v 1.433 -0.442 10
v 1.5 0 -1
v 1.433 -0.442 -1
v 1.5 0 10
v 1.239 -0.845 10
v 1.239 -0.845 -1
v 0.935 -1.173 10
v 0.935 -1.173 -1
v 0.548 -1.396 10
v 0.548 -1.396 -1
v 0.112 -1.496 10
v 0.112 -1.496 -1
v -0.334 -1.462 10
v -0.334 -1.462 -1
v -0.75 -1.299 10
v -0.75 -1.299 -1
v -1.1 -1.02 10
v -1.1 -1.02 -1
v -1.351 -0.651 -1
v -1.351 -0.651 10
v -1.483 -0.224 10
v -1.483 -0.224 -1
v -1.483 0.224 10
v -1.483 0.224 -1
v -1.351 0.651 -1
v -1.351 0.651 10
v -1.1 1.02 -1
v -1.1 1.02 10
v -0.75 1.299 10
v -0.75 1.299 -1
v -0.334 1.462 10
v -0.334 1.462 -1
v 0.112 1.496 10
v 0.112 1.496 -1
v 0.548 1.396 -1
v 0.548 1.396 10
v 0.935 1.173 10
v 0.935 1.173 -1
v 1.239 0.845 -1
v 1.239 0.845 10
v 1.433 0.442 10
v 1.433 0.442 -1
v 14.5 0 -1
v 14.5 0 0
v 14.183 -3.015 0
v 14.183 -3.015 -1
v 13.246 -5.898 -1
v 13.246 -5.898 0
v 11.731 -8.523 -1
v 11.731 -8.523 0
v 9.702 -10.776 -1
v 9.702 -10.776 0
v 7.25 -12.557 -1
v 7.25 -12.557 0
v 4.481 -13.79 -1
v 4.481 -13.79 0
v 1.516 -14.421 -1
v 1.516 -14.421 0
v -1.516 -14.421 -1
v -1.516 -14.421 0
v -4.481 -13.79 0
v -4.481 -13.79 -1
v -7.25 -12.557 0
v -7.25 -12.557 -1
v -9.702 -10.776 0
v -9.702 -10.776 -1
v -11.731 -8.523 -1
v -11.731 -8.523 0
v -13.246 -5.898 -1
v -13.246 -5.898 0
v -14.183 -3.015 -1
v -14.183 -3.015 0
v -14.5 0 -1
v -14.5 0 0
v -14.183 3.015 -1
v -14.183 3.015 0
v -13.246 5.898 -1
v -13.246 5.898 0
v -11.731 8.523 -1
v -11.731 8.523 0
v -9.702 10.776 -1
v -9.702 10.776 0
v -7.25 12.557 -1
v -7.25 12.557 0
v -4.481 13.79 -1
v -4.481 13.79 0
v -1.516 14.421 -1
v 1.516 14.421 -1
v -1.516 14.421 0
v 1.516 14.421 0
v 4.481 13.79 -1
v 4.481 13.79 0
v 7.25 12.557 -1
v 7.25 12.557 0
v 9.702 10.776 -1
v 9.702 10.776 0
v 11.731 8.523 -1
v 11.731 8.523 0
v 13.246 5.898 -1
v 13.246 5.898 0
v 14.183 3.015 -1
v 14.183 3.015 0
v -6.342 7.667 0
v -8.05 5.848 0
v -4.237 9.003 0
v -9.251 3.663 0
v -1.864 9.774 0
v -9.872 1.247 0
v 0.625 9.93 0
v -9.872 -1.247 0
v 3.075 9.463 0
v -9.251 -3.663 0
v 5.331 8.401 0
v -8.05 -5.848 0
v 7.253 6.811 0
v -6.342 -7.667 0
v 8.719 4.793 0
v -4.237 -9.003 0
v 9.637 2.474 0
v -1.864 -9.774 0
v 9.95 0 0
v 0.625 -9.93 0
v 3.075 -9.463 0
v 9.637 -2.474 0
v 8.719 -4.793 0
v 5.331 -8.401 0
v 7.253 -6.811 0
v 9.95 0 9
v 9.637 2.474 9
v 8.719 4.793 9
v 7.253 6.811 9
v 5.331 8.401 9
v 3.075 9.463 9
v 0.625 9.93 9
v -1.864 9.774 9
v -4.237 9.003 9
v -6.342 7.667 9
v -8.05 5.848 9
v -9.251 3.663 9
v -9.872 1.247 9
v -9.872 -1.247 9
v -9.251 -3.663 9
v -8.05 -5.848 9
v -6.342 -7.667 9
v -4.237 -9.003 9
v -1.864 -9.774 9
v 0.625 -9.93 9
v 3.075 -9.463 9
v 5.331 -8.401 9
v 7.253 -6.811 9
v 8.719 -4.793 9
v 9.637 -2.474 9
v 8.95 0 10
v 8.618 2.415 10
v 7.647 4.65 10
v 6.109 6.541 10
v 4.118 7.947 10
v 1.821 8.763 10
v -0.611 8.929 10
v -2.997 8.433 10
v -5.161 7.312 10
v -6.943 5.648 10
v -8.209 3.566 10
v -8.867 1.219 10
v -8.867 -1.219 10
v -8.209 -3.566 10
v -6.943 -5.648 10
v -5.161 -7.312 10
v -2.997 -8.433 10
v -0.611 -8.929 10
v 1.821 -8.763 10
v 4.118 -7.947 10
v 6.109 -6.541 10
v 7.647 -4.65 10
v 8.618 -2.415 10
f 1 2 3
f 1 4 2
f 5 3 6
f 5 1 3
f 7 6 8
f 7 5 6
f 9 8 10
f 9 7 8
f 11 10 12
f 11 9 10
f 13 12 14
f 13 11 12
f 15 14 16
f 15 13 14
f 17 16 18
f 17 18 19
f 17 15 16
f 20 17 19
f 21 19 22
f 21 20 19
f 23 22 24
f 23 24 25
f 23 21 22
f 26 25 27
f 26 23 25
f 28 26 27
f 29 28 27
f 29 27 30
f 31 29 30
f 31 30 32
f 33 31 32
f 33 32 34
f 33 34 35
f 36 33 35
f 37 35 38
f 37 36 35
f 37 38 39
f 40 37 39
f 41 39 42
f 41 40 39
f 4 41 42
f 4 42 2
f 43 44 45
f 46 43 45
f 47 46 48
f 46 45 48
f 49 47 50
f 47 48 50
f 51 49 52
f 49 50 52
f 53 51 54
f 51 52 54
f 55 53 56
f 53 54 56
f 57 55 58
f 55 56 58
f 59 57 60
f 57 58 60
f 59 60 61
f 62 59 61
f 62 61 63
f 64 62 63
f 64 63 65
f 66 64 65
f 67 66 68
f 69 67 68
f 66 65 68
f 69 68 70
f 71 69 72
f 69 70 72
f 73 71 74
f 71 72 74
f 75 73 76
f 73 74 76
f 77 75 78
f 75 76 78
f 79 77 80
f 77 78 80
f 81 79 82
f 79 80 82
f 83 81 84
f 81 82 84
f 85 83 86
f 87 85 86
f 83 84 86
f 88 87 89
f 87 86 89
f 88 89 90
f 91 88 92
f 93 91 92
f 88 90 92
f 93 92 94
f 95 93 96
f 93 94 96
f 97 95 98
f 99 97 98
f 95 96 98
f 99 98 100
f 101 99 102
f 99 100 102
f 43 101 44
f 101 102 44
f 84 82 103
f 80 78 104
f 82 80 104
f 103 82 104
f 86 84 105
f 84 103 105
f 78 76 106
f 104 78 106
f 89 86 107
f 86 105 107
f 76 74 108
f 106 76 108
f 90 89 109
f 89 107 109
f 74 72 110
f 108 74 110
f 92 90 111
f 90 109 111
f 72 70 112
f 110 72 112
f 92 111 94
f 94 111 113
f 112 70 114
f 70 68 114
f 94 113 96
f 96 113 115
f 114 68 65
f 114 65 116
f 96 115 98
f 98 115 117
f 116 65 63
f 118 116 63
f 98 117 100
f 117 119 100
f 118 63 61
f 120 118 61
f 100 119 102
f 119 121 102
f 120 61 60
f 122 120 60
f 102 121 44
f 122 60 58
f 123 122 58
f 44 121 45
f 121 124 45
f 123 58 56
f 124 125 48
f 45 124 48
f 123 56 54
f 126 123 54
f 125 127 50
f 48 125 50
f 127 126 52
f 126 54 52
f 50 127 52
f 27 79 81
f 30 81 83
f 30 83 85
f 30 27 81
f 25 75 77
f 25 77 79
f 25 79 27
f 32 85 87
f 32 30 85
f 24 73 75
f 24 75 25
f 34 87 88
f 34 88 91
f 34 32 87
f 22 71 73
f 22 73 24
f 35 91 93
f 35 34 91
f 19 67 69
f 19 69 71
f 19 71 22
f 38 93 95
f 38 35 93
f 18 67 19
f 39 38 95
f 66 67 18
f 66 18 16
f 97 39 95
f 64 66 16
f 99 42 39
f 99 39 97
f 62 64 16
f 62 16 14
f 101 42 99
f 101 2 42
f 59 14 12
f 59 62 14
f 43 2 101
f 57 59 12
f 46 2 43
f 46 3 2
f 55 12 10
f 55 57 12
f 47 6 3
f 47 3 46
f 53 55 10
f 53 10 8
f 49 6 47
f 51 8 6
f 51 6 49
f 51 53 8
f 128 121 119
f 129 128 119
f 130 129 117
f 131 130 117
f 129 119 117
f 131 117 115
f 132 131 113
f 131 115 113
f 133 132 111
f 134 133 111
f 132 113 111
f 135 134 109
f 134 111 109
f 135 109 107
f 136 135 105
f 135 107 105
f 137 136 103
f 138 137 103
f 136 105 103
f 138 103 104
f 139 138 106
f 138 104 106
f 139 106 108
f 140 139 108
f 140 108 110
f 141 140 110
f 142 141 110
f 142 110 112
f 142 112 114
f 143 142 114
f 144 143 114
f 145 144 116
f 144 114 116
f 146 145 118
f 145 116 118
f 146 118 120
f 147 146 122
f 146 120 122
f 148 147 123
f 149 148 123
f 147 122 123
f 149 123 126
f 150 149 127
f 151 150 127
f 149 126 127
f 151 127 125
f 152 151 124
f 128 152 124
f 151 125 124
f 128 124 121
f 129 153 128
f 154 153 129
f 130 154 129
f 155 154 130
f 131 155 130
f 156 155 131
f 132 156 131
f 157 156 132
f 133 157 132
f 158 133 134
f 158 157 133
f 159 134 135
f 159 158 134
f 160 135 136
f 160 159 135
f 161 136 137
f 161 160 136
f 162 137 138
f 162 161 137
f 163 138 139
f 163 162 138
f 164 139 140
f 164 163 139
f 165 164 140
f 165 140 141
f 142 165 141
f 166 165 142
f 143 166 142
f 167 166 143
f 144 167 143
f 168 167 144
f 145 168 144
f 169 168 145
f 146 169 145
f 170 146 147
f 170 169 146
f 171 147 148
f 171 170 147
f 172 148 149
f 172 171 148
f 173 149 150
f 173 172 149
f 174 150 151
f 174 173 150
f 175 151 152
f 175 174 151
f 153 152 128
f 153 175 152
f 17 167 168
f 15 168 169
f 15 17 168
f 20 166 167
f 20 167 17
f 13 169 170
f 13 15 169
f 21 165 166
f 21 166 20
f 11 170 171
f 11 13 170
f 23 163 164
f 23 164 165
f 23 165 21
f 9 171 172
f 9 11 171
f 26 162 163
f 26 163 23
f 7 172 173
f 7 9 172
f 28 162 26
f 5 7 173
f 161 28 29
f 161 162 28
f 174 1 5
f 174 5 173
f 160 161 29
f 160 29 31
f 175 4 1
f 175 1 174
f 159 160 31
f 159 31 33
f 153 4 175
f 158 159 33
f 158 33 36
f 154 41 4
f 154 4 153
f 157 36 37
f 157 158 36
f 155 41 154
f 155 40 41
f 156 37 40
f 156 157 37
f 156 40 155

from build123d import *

# Parameters (mm, degrees)
SKETCH_R      = 9.95
SKETCH_R_2    = 1.5
PAD_DEPTH     = 10
CHAMFER_SIZE  = 1
SKETCH001_R   = 14.5
SKETCH001_R_2 = 1.5
PAD001_DEPTH  = 1


with BuildPart() as part:
    # Sketch → Pad (new body)
    with BuildSketch(Plane.XY):
        Circle(SKETCH_R)
        Circle(SKETCH_R_2, mode=Mode.SUBTRACT)
    extrude(amount=PAD_DEPTH)

    # Chamfer
    chamfer_edges = [part.edges().sort_by_distance(p)[0] for p in [
        (-9.95, 0, 10),
    ]]
    chamfer(chamfer_edges, length=CHAMFER_SIZE)

    # Sketch001 (on Face3 of Chamfer) → Pad001 (join)
    with BuildSketch(Plane(origin=(0, 0, 0), x_dir=(1, 0, 0), z_dir=(0, 0, -1))):
        Circle(SKETCH001_R)
        Circle(SKETCH001_R_2, mode=Mode.SUBTRACT)
    extrude(amount=PAD001_DEPTH)


solid = part.part
